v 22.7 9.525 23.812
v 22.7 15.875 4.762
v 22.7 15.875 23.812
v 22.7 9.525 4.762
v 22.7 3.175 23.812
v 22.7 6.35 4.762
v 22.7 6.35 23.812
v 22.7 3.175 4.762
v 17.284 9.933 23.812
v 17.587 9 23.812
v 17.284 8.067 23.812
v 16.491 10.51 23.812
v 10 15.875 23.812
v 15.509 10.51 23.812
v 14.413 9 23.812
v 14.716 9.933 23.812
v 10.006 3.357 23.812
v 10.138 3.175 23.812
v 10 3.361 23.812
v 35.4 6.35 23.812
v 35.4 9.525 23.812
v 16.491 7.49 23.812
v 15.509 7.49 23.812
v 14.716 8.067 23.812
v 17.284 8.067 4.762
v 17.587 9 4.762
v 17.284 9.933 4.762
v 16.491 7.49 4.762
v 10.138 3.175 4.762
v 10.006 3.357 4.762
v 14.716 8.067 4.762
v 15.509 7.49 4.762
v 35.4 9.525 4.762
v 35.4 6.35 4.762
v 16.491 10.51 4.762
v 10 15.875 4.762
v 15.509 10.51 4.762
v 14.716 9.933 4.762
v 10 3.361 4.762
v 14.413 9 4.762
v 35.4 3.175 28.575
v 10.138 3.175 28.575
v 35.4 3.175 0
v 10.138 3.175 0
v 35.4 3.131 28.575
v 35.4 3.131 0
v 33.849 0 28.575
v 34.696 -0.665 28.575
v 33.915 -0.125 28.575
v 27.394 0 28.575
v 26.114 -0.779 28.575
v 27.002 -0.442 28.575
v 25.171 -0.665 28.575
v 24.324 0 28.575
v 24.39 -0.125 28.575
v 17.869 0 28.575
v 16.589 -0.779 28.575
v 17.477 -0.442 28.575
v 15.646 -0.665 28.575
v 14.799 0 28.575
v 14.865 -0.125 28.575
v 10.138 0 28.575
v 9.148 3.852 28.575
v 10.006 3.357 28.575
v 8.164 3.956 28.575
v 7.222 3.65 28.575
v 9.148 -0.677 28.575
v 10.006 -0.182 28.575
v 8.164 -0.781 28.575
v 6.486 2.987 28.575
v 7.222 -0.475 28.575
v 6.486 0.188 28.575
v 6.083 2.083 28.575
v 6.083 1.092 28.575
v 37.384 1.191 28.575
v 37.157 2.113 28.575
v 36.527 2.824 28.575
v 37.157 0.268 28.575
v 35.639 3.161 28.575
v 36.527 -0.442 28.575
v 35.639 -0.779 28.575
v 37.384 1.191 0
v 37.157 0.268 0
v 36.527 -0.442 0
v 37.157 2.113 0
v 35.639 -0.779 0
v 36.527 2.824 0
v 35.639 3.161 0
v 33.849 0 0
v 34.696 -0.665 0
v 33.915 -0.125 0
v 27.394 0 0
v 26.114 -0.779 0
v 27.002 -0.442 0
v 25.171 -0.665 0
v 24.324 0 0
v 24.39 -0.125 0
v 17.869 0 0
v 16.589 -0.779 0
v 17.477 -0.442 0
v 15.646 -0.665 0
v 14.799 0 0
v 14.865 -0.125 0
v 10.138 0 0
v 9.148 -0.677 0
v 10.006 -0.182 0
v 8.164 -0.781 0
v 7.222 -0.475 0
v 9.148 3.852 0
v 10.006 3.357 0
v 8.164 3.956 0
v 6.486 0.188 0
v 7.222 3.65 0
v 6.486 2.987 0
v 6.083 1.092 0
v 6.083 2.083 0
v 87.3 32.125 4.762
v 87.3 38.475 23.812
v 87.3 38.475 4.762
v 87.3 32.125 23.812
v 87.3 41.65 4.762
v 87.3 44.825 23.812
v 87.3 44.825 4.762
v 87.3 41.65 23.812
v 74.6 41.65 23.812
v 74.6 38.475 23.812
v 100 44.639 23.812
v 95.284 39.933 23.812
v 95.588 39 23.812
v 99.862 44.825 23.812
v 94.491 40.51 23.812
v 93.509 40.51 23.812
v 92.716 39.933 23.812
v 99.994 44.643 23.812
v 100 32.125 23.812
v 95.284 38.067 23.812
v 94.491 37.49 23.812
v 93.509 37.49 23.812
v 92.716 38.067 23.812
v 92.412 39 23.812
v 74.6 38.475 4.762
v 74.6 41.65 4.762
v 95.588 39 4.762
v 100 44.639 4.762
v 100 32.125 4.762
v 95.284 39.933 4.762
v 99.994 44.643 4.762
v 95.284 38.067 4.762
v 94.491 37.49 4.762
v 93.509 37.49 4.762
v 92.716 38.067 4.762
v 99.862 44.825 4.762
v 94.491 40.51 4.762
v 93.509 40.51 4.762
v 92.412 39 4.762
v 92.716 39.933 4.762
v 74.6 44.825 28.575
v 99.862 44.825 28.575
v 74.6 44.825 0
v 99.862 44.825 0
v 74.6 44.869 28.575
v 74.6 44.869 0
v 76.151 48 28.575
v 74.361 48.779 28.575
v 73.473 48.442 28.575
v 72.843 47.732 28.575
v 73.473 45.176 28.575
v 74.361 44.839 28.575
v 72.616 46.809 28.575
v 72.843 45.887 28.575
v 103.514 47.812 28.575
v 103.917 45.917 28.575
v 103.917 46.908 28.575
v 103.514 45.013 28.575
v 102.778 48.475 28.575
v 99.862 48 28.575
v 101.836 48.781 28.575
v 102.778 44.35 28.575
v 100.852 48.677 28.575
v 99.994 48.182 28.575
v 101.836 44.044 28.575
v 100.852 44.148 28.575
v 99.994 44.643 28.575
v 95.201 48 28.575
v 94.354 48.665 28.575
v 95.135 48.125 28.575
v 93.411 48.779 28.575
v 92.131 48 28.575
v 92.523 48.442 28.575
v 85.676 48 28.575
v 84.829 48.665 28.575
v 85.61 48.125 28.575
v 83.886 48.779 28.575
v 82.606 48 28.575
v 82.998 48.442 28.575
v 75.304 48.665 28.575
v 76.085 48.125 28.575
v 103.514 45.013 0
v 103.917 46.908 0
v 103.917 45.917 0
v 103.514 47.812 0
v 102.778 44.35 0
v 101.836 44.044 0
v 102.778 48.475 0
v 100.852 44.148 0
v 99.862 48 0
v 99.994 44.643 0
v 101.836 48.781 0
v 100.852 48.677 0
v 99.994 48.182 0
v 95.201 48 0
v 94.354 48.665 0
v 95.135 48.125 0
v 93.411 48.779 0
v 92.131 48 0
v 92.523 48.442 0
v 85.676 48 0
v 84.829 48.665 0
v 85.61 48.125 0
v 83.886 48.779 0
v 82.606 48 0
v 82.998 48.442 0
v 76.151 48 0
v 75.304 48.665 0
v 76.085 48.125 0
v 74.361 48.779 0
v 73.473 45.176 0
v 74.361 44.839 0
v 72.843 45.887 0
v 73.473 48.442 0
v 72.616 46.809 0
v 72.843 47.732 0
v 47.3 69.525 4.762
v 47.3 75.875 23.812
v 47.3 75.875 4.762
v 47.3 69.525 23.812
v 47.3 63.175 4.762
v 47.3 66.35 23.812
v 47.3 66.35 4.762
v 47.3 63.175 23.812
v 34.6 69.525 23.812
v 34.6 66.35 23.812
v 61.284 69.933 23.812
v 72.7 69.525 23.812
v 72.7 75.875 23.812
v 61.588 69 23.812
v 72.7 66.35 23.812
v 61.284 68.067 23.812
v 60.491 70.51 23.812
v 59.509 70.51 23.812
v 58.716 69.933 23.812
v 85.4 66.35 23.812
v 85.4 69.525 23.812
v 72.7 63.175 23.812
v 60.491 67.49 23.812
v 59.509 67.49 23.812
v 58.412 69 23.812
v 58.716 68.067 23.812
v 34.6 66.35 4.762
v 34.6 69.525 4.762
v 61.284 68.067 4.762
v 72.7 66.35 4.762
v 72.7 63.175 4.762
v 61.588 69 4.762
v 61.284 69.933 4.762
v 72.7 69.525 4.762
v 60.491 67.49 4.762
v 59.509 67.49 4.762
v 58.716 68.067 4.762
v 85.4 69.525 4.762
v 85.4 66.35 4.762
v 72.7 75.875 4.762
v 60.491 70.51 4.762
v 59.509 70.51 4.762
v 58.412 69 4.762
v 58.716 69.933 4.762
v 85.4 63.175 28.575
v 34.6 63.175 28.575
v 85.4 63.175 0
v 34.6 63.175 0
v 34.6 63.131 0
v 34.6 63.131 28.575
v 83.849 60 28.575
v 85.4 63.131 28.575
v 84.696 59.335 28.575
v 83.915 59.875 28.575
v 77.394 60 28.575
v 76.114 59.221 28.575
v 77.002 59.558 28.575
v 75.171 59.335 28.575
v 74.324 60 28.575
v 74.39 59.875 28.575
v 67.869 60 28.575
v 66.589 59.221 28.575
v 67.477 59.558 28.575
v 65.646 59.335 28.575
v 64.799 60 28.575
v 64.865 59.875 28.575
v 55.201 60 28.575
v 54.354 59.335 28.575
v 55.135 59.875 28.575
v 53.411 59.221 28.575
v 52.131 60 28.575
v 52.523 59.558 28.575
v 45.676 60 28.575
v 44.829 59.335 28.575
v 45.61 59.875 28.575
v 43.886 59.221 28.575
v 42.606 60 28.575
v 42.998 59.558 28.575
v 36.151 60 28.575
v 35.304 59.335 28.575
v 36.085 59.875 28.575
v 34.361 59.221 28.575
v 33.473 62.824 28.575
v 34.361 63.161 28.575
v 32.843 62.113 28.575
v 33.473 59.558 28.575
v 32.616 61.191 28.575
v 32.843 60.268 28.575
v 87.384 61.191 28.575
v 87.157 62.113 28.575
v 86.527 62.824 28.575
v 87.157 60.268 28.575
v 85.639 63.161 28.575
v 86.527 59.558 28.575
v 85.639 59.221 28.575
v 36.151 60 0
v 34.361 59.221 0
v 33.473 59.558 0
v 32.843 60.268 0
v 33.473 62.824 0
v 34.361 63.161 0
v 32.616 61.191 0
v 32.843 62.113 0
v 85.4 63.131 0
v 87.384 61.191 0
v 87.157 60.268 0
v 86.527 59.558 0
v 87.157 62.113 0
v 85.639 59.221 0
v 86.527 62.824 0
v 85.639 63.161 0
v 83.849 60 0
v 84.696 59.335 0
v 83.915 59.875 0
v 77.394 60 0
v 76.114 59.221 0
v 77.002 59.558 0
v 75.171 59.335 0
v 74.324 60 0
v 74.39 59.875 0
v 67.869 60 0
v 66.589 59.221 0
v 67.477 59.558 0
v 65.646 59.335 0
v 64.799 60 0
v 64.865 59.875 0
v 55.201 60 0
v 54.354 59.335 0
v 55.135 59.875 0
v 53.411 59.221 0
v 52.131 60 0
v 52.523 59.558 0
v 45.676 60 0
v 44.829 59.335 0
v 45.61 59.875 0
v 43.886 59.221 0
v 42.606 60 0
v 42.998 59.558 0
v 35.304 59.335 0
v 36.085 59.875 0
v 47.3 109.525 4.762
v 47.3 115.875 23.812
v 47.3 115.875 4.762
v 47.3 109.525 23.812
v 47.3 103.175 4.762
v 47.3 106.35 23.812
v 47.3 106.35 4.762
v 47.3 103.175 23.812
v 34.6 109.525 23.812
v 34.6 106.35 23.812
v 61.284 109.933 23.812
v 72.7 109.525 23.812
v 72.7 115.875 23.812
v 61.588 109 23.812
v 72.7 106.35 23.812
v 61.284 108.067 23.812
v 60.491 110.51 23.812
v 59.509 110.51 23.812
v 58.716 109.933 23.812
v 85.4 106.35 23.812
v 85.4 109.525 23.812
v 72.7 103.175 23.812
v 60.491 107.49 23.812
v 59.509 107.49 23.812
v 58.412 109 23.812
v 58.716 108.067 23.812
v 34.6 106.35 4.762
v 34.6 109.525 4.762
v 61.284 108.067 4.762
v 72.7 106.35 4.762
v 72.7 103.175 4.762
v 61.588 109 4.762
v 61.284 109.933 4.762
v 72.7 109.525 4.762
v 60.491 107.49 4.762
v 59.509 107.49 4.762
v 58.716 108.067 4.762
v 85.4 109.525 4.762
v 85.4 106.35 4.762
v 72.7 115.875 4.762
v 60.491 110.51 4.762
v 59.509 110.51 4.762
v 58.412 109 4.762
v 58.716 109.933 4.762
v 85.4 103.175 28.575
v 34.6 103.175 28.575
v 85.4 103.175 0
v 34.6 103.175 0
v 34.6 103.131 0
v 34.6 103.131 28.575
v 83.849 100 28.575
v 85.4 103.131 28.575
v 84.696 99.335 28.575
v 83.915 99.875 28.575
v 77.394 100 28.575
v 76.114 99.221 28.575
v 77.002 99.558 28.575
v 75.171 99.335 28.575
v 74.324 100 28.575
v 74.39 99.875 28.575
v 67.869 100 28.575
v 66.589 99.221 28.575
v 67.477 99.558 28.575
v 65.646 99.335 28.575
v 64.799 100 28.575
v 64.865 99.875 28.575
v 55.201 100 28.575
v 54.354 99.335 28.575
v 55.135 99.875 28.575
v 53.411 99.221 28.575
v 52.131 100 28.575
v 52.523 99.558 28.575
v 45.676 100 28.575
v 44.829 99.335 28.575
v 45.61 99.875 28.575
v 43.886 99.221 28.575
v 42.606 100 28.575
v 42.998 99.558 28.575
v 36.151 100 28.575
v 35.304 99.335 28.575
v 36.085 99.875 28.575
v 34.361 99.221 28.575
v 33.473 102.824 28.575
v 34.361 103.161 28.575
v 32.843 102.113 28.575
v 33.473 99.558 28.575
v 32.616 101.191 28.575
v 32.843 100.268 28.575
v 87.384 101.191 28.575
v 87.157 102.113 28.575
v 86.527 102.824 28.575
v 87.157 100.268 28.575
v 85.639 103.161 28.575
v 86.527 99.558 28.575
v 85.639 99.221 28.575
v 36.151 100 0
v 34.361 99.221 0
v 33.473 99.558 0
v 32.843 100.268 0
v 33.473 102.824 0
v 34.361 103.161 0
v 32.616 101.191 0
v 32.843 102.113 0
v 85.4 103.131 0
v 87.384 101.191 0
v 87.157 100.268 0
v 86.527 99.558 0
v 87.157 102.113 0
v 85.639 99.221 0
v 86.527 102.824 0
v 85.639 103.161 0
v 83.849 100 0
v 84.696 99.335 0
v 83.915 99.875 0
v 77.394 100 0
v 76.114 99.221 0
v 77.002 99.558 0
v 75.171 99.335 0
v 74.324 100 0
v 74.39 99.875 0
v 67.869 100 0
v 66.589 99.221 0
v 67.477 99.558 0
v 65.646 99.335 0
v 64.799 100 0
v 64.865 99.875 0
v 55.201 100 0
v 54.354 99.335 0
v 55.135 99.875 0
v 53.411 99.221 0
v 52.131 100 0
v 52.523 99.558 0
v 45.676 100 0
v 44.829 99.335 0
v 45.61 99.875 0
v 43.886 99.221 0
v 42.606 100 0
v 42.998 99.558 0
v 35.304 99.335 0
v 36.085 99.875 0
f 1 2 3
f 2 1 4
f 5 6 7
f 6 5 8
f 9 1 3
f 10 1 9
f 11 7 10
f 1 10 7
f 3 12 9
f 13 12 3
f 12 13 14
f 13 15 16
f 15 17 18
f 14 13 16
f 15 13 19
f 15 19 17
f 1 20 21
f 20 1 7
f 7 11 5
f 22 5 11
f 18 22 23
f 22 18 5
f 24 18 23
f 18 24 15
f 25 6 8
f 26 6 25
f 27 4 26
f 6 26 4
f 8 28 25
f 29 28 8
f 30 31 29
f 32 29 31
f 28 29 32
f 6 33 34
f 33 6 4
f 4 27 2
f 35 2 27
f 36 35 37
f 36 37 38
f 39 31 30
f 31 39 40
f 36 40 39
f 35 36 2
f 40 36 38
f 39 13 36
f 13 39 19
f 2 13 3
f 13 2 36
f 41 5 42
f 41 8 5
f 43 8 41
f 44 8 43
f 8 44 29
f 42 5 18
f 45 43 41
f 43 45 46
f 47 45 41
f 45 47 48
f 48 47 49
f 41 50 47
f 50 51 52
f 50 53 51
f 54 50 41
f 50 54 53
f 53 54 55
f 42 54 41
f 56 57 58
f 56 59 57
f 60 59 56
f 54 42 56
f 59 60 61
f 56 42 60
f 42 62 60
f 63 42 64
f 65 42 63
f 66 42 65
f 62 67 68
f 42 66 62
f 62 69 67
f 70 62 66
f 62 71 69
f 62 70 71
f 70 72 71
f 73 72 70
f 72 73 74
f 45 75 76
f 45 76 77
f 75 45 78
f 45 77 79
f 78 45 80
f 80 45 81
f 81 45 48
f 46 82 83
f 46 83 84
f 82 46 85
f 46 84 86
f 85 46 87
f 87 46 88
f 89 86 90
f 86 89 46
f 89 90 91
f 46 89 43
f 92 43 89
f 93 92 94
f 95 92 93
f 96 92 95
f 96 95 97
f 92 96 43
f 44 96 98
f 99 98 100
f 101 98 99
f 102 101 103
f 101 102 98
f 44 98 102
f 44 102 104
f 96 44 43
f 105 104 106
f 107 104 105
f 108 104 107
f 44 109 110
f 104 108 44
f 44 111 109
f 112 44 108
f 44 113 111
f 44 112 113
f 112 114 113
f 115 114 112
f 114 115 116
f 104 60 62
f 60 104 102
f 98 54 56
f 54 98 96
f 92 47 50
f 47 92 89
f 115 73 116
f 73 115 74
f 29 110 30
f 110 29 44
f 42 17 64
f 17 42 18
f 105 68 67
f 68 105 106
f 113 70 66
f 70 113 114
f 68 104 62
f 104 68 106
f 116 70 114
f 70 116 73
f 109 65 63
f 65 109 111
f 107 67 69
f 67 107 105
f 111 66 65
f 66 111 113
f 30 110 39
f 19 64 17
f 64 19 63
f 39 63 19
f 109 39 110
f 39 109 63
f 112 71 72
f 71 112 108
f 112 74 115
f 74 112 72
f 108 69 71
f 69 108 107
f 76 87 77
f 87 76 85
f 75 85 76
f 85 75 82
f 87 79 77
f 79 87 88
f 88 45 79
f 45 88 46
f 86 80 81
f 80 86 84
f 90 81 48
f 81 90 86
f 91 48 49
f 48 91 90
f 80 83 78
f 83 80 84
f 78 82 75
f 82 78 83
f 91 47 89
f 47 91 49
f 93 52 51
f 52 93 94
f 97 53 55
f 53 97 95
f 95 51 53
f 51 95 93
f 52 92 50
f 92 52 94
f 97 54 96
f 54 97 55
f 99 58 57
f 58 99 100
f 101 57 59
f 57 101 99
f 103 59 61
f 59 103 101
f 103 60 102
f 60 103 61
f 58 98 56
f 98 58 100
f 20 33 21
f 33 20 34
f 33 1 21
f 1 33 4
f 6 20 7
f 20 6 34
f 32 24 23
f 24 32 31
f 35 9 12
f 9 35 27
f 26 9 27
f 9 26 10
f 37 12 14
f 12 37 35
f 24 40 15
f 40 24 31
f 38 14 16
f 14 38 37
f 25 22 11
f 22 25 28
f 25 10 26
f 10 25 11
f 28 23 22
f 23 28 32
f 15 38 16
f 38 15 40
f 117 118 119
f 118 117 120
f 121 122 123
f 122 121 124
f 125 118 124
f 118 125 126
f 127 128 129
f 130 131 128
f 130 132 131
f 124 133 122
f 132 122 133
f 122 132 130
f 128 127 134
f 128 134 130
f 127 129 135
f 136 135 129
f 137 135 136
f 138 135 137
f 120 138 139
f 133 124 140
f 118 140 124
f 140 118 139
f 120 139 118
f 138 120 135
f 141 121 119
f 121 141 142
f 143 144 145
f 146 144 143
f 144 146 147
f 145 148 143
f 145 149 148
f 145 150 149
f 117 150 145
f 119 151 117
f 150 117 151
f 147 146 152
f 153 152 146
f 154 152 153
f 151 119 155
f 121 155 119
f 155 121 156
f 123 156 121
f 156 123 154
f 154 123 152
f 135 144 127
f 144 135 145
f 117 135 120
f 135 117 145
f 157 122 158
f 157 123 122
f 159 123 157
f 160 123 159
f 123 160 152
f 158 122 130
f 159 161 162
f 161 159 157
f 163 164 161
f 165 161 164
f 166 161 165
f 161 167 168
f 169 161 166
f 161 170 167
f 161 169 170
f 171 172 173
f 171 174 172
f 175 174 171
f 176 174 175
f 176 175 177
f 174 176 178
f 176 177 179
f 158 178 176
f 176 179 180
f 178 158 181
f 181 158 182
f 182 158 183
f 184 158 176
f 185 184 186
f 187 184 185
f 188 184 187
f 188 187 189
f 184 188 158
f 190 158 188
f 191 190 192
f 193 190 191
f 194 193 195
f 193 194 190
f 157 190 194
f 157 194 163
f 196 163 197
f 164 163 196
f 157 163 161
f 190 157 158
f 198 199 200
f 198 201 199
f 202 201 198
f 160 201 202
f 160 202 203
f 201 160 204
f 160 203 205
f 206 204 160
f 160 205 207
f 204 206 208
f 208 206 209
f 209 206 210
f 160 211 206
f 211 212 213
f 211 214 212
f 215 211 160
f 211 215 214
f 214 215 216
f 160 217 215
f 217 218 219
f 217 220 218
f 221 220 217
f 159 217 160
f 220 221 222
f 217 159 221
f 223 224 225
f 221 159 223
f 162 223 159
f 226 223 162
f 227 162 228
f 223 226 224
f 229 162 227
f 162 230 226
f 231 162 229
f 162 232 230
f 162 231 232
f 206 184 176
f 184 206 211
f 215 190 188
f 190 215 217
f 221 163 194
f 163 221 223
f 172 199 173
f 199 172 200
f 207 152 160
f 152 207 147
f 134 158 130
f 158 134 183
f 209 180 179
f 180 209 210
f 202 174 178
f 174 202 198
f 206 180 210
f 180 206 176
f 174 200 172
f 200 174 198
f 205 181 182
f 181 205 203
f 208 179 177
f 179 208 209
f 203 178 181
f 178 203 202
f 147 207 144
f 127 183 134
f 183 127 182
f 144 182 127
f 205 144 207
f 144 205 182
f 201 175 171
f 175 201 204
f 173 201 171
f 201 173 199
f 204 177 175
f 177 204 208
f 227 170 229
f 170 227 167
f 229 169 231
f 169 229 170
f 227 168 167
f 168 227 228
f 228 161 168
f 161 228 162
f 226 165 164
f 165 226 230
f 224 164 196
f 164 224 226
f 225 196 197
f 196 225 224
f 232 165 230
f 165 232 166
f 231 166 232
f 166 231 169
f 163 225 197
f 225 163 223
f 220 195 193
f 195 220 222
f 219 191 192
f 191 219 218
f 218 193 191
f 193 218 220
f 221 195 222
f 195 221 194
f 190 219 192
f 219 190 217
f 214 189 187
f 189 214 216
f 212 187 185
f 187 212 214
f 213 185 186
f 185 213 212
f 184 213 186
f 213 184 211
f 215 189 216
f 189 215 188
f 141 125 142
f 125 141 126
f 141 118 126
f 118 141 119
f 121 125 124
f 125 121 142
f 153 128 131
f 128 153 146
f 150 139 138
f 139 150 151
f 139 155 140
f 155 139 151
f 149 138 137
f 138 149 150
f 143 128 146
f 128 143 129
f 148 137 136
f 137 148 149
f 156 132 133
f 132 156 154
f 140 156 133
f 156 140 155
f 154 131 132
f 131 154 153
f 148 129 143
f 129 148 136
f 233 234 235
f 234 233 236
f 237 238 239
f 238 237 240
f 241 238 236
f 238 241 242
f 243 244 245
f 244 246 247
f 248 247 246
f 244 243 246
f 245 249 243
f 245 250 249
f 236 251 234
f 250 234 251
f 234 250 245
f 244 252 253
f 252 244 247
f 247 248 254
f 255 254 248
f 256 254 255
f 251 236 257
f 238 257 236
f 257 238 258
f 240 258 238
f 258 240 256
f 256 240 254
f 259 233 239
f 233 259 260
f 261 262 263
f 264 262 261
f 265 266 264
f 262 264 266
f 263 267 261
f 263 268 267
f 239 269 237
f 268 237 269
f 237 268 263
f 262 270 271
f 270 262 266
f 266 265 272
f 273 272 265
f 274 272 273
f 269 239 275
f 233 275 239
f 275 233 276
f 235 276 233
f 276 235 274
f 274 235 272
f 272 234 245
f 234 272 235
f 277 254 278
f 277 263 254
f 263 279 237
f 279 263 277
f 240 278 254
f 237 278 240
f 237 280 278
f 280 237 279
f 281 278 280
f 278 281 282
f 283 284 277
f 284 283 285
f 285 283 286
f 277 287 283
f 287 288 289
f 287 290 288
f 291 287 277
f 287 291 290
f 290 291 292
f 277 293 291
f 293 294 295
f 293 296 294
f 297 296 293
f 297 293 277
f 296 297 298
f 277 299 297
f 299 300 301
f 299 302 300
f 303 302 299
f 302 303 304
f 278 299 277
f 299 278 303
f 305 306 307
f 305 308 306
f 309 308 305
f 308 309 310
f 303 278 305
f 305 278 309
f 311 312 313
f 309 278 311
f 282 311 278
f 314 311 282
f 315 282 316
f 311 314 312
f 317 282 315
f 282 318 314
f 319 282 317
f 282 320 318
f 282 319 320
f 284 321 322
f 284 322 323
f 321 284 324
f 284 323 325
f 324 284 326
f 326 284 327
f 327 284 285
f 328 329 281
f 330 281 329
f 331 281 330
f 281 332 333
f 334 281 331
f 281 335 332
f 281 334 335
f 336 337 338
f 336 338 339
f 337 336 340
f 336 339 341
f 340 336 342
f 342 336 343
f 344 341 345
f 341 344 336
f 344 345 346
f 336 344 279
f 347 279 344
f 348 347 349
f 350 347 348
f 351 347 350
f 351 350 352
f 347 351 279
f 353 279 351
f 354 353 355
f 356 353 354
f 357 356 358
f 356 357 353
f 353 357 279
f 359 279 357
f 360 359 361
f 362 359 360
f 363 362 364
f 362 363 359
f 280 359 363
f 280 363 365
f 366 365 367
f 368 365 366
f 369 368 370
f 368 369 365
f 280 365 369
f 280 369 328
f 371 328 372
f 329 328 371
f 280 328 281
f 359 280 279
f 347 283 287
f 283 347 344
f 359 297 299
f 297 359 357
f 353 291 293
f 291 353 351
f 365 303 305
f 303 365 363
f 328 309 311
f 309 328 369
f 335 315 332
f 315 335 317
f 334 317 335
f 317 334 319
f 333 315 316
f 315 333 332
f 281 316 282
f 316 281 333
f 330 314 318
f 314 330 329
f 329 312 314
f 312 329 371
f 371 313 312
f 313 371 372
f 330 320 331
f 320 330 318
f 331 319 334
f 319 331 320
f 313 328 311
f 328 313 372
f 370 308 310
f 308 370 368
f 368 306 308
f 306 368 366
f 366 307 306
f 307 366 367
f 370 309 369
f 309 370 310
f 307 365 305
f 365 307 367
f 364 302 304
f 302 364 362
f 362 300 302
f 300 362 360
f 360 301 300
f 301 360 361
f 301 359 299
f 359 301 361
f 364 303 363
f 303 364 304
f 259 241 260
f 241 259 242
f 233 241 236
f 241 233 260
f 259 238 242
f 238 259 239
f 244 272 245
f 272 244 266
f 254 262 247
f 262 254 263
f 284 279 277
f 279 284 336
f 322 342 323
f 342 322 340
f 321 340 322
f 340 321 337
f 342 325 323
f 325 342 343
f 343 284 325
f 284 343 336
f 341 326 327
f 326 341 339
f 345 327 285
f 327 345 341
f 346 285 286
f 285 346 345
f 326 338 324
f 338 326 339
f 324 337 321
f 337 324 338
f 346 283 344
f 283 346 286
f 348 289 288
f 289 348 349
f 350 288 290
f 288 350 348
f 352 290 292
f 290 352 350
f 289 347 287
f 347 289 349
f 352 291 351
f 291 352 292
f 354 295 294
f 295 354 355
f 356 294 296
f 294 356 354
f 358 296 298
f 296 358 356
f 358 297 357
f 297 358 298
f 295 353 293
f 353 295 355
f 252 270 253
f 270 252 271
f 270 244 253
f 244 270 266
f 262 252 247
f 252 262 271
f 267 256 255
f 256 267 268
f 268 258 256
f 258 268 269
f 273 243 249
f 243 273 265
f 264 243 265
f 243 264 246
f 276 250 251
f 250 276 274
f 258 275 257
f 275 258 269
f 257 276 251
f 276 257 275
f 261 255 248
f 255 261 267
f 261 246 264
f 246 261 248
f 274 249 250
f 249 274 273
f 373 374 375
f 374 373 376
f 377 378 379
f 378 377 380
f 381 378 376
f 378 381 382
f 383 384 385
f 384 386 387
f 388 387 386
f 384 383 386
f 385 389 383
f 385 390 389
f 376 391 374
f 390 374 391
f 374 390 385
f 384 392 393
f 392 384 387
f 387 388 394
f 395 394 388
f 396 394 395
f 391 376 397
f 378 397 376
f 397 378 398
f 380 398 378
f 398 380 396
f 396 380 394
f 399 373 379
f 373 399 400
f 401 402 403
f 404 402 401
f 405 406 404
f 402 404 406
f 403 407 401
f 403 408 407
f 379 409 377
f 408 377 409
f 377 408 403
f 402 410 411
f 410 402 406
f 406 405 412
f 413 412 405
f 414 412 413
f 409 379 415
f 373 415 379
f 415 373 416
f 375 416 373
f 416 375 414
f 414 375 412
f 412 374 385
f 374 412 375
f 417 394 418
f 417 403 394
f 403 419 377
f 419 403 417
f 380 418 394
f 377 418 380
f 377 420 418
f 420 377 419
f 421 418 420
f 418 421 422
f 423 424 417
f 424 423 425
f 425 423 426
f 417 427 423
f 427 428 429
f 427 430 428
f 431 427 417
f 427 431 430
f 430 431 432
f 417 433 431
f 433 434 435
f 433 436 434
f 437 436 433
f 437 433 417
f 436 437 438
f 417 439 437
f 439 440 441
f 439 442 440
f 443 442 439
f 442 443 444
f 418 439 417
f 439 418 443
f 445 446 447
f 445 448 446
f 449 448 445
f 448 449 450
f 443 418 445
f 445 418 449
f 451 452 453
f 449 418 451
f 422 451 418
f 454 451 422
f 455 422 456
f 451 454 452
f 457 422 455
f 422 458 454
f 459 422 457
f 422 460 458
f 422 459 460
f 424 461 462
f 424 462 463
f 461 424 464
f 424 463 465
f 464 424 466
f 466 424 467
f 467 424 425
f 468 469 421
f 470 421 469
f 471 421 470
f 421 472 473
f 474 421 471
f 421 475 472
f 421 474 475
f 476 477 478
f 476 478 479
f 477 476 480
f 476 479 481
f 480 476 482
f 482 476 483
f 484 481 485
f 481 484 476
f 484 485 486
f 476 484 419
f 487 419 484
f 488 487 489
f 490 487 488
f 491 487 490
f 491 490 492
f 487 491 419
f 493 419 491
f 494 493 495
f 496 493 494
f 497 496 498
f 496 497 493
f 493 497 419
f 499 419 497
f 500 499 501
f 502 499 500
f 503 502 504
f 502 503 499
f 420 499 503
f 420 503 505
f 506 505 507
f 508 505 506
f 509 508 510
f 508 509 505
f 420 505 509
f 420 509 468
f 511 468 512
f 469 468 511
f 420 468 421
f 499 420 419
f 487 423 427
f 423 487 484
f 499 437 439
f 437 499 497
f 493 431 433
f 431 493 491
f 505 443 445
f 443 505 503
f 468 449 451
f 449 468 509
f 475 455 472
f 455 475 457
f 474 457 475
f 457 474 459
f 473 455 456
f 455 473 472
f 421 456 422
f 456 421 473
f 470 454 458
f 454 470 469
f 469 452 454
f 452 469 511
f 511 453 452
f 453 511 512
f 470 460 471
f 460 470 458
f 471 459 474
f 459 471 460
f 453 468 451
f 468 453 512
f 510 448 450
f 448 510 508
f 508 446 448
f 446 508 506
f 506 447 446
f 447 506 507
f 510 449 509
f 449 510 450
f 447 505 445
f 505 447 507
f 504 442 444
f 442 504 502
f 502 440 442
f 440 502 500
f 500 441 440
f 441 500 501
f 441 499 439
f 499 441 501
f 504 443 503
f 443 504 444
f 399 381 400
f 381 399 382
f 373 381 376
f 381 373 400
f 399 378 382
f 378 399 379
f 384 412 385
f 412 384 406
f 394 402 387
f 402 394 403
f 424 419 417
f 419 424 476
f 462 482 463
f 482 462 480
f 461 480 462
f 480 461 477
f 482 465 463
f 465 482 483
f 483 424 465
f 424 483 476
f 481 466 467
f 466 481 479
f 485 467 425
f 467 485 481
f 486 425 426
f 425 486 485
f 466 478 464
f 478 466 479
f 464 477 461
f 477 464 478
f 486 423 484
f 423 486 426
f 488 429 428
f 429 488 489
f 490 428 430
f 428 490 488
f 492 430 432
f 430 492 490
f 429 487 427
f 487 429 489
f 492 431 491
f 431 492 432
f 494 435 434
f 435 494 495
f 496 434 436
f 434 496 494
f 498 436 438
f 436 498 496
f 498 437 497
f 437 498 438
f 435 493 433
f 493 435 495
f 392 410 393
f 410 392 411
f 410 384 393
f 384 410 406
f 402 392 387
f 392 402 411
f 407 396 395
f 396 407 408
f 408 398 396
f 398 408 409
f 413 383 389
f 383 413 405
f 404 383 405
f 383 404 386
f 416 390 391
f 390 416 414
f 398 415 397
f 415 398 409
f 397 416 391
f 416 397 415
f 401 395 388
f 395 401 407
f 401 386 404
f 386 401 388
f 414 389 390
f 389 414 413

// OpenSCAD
// file: joints.scad
/**
 * joints.scad is part of Paper Laptop project.
 * This file contains various models for joining two or
 * more pieces of flat materials together.
 *
 * @author R. S. Doiel, <rsdoiel@gmail.com>
 * copyright (c) 2016 all rights reserved
 * Released under a BSD 2-clause license
 */

// Foam board firm enough to make a case with is about
// 1/8th to 1/4th inch (6.35mm) thick. Usually sold in single sheets
// of about 20"x30".

//
// Basic models are for parts without any holes for fasteners.
//

/*
 * CornerBasic() - corner joint without fastener hole
 */
module CornerBasic() {
    u = 3.175; // Unit is 3.175mm or 1/8th inch:w
    t = 6.35; // Thickness of the 1/4th" Foam board

    // Inner block, width, depth, height
    translate([0, t, t/2]) {
        difference() {
            color([1,0,0]) cube([25.4, 25.4, 25.4]);
            translate([t*3.5,t*3.5,-1]) {
                color([1,0,1]) cylinder(h=28,r=t*1.25,center=false);
            }
        }
    }

     // Inner shell
    translate([t,2*t,t/2]) {
        color([0,1,0]) cube([50.8-t,t/2,25.4]);
        color([0,1,0]) cube([t/2,50.8-t,25.4]);
    }

    // Outer shell
    color([0,1,0]) cube([50.8,t,25.4+t]);
    translate([-t,t,0]) {
        color([0,1,0]) cube([t,50.8,25.4+t]);
    }
    // Outer corners
    translate([u*-1,u,0]) {
        color([0,1,0]) cylinder(h=25.4+t,r=1.5*u,center=false);
    }

    // Outer bumps
    translate([u*-1.25,u*18,0]) {
        color([0,1,0]) cylinder(h=25.4+t,r=1.25*u,center=false);
    }
    translate([u*-1.25,u*12,0]) {
        color([0,1,0]) cylinder(h=25.4+t,r=1.25*u,center=false);
    }
    translate([u*-1.25,u*6,0]) {
        color([0,1,0]) cylinder(h=25.4+t,r=1.25*u,center=false);
    }

    translate([u*16,u*0.75,0]) {
        color([0,1,0]) cylinder(h=25.4+t,r=1.25*u,center=false);
    }
    translate([u*10,u*0.75,0]) {
        color([0,1,0]) cylinder(h=25.4+t,r=1.25*u,center=false);
    }
    translate([u*4,u*0.75,0]) {
        color([0,1,0]) cylinder(h=25.4+t,r=1.25*u,center=false);
    }
}

//
// Corner() basic corner joint plus hole for fastener
//
module Corner() {
    // Scale down the basic corner so that the
    // for 50% width/depth, 75% of height
    scale([0.5, 0.5, 0.75]) {
        difference() {
            u = 3.175;
            CornerBasic();
            // Add a hole for screw
            translate([12,18,0]) {
                color([0,0,1]) cylinder(
                    h=25.4+(4*u),
                    r=u,
                    center=false
                );
            }
        }
    }
}

//
// EndBasic
//
module EndBasic() {
    u = 3.175; // Unit is 3.175mm or 1/8th inch:w
    t = 6.35; // Thickness of the 1/4th" Foamboard

    // Inner block, width, depth, height
    translate([0, t, t]) {
            color([1,0,0]) cube([25.4, 25.4, 25.4]);
    }
    // Outer shell
    color([0,1,0]) cube([50.8,t,25.4+(2*t)]);

    // Outer corners
    translate([u*-1,u,0]) {
        color([0,1,0]) cylinder(h=25.4+(2*t),r=1.5*u,center=false);
    }

    translate([u*16,u*0.75,0]) {
        color([0,1,0]) cylinder(h=25.4+(2*t),r=1.25*u,center=false);
    }
    translate([u*10,u*0.75,0]) {
        color([0,1,0]) cylinder(h=25.4+(2*t),r=1.25*u,center=false);
    }
    translate([u*4,u*0.75,0]) {
        color([0,1,0]) cylinder(h=25.4+(2*t),r=1.25*u,center=false);
    }

    // Inner shell
    translate([t,2*t,t]) {
        color([0,1,0]) cube([50.8-t,t,25.4]);
    }
}

//
// End() basic corner joint plus hole for fastener
//
module End() {
    // Scale down the basic corner so that the
    // for 50% width/depth, 75% of height
    scale([0.5, 0.5, 0.75]) {
        difference() {
            u = 3.175;
            EndBasic();
            // Add a hole for screw
            translate([12,18,0]) {
                color([0,0,1]) cylinder(h=25.4+(4*u),r=u,center=false);
            }
        }
    }
}

//
// SpliceBasic
//
module SpliceBasic() {
    u = 3.175; // Unit is 3.175mm or 1/8th inch:w
    t = 6.35; // Thickness of the 1/4th" Foamboard

    // Inner block (cube: [width, depth, height])
    translate([0, t, t]) {
            color([1,0,0]) cube([25.4, 25.4, 25.4]);
    }
    // Outer shell
    color([0,1,0]) cube([50.8,t,25.4+(2*t)]);

    // Outer corners
    translate([u*16,u*0.75,0]) {
        color([0,1,0]) cylinder(h=25.4+(2*t),r=1.25*u,center=false);
    }
    translate([u*10,u*0.75,0]) {
        color([0,1,0]) cylinder(h=25.4+(2*t),r=1.25*u,center=false);
    }
    translate([u*4,u*0.75,0]) {
        color([0,1,0]) cylinder(h=25.4+(2*t),r=1.25*u,center=false);
    }

    // Inner shell
    translate([t,2*t,t]) {
        color([0,1,0]) cube([50.8-t,t,25.4]);
    }

    // Mirrored shapes
    mirror(180) {
        // Inner block (cube: [width, depth, height])
        translate([0, t, t]) {
                color([1,0,0]) cube([25.4, 25.4, 25.4]);
        }
        // Outer shell
        color([0,1,0]) cube([50.8,t,25.4+(2*t)]);

        // Outer corners
        translate([u*16,u*0.75,0]) {
            color([0,1,0]) cylinder(h=25.4+(2*t),r=1.25*u,center=false);
        }
        translate([u*10,u*0.75,0]) {
            color([0,1,0]) cylinder(h=25.4+(2*t),r=1.25*u,center=false);
        }
        translate([u*4,u*0.75,0]) {
            color([0,1,0]) cylinder(h=25.4+(2*t),r=1.25*u,center=false);
        }

        // Inner shell
        translate([t,2*t,t]) {
            color([0,1,0]) cube([50.8-t,t,25.4]);
        }
    }
}

//
// Splice() basic corner joint plus hole for fastener
//
module Splice() {
    scale([0.5, 0.5, 0.75]) {
        difference() {
            u = 3.175;
            SpliceBasic();
            // Add a hole for screw
            translate([0,18,0]) {
                color([0,0,1]) cylinder(h=25.4+(4*u),r=u,center=false);
            }
        }
    }
}


// Four corner joints
module FourCornersGrouped() {
    Corner();
    translate([120,6.35,0]) {
        rotate(90) {
            Corner();
        }
    }
    translate([114, 124, 0]) {
        rotate(180) {
            Corner();
            translate([120,6.35,0]) {
                rotate(90) {
                    Corner();
                }
            }
        }
    }
}

// Two End Pieces
module TwoEndsGrouped() {
    translate([0, 0, 0]) {
        End();
    }
    translate([114, 0, 0]) {
        mirror(180) End();
    }
}

module TwoSplicesGrouped() {
    translate([58, 0, 0]) {
        Splice();
    }
    translate([58, 38, 0]) {
        Splice();
    }
}

//Corner();
//Splice();
//End();
//FourCornersGrouped();
//TwoEndsGrouped();
//TwoSplicesGrouped();
// main file
/**
 * A collection of parts to print together.
 */
 include <joints.scad>
 
translate([10, 0, 0]) {
    End();
}
translate([100, 48, 0]) {
    rotate(180) {
        End();
    }
}

translate([60, 60, 0]) {
    Splice();
}
translate([60, 100, 0]) {
    Splice();
}
